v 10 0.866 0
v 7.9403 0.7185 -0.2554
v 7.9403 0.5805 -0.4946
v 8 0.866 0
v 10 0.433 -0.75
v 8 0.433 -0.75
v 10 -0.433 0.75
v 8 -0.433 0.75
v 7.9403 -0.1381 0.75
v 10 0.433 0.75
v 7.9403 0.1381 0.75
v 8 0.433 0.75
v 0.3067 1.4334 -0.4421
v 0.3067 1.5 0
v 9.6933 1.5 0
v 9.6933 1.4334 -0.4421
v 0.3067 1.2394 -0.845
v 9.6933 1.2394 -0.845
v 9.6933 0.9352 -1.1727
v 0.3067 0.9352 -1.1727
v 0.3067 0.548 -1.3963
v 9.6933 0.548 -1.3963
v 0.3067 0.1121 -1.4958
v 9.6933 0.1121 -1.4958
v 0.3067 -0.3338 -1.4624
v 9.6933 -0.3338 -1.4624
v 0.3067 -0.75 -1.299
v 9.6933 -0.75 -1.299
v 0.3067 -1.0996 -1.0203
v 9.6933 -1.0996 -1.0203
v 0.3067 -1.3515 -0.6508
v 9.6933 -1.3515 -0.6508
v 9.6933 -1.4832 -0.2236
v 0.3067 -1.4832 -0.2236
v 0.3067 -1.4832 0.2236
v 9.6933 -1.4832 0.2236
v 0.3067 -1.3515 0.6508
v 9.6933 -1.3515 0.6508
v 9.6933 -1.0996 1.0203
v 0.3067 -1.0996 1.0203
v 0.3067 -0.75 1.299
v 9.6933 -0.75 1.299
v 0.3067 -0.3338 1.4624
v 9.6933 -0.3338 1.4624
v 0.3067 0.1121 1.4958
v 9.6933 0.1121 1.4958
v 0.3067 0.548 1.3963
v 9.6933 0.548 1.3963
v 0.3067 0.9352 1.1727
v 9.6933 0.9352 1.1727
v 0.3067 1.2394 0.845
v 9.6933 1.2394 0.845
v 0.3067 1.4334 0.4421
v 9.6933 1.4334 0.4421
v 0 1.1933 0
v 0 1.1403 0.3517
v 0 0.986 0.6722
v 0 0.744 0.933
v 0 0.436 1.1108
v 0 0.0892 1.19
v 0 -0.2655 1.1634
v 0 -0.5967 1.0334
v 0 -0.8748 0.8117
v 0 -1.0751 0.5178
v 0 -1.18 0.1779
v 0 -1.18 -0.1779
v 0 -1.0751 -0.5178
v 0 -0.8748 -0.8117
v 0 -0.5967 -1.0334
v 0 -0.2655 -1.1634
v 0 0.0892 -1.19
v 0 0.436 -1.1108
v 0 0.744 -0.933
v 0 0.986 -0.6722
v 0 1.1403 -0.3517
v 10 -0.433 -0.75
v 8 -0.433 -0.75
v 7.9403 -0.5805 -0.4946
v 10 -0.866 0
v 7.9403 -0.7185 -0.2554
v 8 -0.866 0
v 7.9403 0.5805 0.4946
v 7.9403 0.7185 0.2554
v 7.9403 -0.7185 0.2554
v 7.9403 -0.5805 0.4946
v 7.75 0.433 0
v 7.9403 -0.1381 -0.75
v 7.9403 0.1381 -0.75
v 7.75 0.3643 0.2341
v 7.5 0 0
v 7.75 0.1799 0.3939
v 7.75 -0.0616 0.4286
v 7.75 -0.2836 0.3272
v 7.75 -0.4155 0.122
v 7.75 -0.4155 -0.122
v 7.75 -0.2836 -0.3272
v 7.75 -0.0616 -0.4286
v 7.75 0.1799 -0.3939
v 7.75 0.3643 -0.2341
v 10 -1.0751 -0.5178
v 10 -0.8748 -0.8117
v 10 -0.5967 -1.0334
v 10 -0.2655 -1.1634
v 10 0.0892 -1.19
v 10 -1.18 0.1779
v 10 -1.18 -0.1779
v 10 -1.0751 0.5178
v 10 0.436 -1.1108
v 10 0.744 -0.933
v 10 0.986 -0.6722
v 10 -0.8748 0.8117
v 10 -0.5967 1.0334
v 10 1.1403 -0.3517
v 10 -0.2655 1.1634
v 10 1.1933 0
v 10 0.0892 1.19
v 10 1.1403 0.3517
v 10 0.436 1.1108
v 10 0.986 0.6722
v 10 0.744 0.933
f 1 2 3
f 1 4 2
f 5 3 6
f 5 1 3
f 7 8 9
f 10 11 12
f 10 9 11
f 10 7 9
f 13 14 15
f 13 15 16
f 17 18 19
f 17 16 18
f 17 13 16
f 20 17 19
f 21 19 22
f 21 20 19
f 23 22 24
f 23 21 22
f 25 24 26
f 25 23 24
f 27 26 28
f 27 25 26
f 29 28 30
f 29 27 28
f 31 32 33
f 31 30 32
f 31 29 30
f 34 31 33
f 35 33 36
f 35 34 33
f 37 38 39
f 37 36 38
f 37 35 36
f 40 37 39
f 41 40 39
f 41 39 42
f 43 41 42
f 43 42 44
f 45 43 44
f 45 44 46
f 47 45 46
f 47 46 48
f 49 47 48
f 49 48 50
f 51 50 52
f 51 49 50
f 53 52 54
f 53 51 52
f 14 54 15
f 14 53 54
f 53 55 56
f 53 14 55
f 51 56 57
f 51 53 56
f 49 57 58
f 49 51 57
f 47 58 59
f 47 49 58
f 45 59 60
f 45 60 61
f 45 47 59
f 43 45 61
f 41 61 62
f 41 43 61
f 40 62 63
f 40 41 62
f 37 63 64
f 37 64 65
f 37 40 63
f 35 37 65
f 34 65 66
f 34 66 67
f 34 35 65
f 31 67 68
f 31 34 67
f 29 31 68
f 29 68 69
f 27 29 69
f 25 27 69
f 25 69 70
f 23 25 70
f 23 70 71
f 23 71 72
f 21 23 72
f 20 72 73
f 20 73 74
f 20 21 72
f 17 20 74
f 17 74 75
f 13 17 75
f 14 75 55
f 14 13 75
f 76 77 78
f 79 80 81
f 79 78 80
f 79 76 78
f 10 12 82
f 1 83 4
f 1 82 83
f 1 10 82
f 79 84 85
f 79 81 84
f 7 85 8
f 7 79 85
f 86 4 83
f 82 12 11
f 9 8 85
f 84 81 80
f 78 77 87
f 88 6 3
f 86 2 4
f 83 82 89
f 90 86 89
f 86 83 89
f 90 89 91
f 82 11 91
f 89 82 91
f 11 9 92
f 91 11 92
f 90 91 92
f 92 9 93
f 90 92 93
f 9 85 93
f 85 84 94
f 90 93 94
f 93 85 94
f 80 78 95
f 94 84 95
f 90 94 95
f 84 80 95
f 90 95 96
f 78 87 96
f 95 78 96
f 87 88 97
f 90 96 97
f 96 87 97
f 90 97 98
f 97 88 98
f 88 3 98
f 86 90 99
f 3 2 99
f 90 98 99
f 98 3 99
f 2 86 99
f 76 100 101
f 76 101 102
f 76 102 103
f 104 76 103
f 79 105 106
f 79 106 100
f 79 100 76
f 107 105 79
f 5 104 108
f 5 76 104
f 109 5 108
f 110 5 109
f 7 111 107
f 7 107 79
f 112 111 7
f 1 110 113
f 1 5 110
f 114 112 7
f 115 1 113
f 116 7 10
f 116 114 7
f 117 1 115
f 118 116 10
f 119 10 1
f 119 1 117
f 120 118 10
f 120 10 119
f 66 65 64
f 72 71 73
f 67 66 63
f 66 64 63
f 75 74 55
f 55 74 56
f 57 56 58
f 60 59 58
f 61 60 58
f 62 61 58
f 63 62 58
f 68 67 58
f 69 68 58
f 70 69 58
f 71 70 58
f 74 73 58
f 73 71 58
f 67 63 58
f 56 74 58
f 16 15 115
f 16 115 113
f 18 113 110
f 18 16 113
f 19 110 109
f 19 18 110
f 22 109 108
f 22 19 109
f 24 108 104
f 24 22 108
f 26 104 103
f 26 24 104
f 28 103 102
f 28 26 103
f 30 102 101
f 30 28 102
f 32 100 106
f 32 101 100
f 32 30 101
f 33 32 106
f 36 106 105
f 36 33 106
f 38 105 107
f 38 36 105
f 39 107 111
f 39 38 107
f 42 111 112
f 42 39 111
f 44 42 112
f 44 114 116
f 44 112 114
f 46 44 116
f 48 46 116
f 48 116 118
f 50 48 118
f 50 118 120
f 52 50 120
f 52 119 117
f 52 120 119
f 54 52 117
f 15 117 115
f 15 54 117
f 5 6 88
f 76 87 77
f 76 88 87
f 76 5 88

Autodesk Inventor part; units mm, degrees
ref_plane "YZ Plane" through (0, 0, 0) normal (1, 0, 0) x (0, 1, 0)
ref_plane "XZ Plane" through (0, 0, 0) normal (0, 1, 0) x (-1, 0, 0)
sketch "Skizze1" plane through (0, 0, 0) normal (0, 0, 1) x (1, 0, 0)
  line L0 (0, 0) -> (7.5, 0)
  line L1 (10, 0.866) -> (10, 1.5)
  line L2 (10, 1.5) -> (0, 1.5)
  line L3 (10, 0.866) -> (8, 0.866)
  line L4 (8, 0.866) -> (7.5, 0)
  line L5 (0, -0.3) -> (0, 1.8) projected
  line L6 (0, 1.5) -> (0, 0)
  dimension "d0" = 2
  dimension "d1" = 60
  dimension "d2" = 3
  dimension "d3" = 1.7321
  dimension "d5" = 10
revolve "Körper" add sketch "Skizze1" angle 360 about axis through (0, 0, 0) along (1, 0, 0)
sketch "Skizze2" plane through (10, 0, 0) normal (1, 0, 0) x (0, 1, 0)
  circle A0 centre (0, 0) radius 0.866 projected
  line L0 (-0.433, 0.75) -> (0.433, 0.75)
  line L1 (0.433, 0.75) -> (0.866, 0)
  line L2 (0.866, 0) -> (0.433, -0.75)
  line L3 (0.433, -0.75) -> (-0.433, -0.75)
  line L4 (-0.433, -0.75) -> (-0.866, 0)
  line L5 (-0.866, 0) -> (-0.433, 0.75)
  point P0 (0, 0)
  point P1 (0, 0)
extrude "Loch" add sketch "Skizze2" against normal up to next contours L1 A0 | A0 L2 | L0 A0 | A0 L3 | L5 A0 | A0 L4
thread "Gewinde" size "M3x0.5" class "6g" standard "ISO Metric profile" length 10
chamfer "Fase1" distance 0.3067 angle 45 1 edges at (10, -1.5, 0) measured on face at (6.6667, 1.4951, -0.1207)
chamfer "Fase2" distance 0.3067 angle 45 1 edges at (0, -1.5, 0) measured on face at (3.2311, 1.4806, -0.2406)
ref_plane "Work Plane1" through (5, 0, 0) normal (0, 0, 1) x (1, 0, 0)
equation "\"d0\" = INTI"
equation "\"d2\" = NND"
equation "\"d3\" = 1.1547 * SW"
equation "\"d5\" = NLG"
equation "\"d8\" = NLG"
equation "\"d10\" = -0.5 * GD1 + 0.5 * NND"
equation "\"d11\" = FAWI"
equation "\"d34\" = -0.5 * GD1 + 0.5 * NND"
equation "\"d12\" = -0.5 * GD1 + 0.5 * NND"
equation "\"d13\" = FAWI"
equation "\"d35\" = -0.5 * GD1 + 0.5 * NND"
equation "\"NND\" = 3"
equation "\"NLG\" = 10"
equation "\"INTI\" = 2"
equation "\"FAWI\" = 45deg"
equation "\"SW\" = 1.5"
equation "\"GD1\" = THREADDIA - 1.2269 * PTC"
equation "\"SPD\" = 2"
equation "\"GUL\" = 0.61345 * PTC"
equation "\"TOA\" = 30deg"
equation "\"THREADDIA\" = 3"
equation "\"PTC\" = 0.5"
equation "\"FAWI1\" = 45deg"
equation "\"GAL\" = 0.61345 * PTC"
equation "\"E0\" = 1.155 * SW"
properties part number "DIN 913 - M3 x 10" material "Stahl, weich"
